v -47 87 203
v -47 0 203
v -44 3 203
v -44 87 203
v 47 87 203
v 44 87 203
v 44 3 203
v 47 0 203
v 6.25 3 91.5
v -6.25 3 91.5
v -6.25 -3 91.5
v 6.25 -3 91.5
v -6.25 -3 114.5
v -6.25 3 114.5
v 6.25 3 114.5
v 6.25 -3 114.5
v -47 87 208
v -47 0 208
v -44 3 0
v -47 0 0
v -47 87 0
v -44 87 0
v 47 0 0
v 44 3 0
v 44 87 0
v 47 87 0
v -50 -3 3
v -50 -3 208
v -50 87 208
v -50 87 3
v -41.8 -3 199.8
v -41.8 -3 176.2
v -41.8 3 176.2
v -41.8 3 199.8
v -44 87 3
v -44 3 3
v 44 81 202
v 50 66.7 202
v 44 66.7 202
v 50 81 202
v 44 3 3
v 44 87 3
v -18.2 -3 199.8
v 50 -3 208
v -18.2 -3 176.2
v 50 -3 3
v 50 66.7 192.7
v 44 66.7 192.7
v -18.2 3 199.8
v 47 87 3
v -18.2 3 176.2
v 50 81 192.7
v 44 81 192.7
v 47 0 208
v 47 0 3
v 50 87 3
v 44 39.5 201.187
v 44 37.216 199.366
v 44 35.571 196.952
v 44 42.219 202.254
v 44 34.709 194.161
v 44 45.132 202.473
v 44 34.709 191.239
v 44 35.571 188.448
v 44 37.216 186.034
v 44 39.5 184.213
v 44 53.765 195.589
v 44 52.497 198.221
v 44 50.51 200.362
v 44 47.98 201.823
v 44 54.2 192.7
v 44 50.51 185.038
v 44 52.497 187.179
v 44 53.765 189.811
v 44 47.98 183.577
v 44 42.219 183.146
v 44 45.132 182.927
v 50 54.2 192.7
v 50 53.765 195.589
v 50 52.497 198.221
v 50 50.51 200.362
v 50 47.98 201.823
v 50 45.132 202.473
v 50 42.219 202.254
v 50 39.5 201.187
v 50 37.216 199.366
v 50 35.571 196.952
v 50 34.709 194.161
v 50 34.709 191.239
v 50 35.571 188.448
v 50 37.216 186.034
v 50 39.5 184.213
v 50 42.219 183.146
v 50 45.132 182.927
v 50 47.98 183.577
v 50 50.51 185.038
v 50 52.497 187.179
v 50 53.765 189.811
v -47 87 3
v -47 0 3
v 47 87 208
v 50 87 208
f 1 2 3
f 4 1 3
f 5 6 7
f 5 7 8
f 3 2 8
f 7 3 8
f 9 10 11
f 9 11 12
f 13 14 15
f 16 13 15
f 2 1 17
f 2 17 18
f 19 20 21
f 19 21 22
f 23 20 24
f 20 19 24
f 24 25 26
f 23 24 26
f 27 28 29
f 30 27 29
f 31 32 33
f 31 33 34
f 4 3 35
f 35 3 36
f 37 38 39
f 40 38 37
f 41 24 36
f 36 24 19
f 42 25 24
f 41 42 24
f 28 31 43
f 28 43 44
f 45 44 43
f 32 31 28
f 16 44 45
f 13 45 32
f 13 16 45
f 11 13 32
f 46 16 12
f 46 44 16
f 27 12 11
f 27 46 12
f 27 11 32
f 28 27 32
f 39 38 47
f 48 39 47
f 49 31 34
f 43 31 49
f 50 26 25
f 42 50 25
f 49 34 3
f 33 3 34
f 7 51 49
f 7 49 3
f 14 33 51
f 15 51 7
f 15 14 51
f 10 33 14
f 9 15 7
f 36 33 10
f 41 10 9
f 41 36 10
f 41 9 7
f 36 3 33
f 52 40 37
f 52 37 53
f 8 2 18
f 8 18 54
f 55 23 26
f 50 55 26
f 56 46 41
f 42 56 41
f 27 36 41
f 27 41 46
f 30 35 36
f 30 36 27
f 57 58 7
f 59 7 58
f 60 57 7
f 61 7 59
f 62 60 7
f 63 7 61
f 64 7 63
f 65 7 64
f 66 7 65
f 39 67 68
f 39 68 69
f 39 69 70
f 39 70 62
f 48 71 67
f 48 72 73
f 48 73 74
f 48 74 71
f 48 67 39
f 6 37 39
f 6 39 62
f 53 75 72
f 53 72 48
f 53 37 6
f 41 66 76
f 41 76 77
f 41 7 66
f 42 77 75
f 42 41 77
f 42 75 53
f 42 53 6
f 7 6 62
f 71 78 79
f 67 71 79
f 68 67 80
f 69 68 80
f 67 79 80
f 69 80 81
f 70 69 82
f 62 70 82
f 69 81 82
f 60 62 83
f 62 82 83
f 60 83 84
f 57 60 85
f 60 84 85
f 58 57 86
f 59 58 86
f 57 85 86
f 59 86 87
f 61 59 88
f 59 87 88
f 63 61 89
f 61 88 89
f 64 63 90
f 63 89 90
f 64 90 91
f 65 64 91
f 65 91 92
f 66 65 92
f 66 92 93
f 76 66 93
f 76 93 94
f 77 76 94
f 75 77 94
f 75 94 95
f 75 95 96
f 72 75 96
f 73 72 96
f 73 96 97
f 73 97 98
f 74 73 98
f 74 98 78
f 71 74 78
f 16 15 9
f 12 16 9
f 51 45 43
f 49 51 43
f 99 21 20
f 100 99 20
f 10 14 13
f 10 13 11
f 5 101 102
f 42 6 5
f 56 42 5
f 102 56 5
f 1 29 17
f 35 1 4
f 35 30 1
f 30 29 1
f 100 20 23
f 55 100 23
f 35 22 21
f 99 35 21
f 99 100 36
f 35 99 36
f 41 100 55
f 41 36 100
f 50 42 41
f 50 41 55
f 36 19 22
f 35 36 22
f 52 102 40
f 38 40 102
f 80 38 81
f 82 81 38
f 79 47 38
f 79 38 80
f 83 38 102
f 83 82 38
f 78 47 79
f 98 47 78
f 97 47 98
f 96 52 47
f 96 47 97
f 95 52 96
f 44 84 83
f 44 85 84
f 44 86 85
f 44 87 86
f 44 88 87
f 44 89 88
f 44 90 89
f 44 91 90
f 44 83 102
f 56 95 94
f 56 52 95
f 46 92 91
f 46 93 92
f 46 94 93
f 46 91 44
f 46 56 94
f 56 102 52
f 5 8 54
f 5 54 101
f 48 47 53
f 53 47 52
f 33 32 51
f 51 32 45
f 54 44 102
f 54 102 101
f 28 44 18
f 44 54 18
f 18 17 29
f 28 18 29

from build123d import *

# Parameters (mm, degrees)
SALIENTE_EXTRUIR1_DEPTH = 3
SALIENTE_EXTRUIR2_DEPTH = 100
SIMETR_A2_START         = -3
SIMETR_A2_OUTLINE_W     = 6
SIMETR_A2_OUTLINE_H     = 100
SIMETR_A2_DEPTH         = 90
SIMETR_A2_2_OUTLINE_W   = 88
SIMETR_A2_2_OUTLINE_H   = 100
SIMETR_A2_2_DEPTH       = 6
CROQUIS3_W              = 12.5
CROQUIS3_H              = 23
CORTAR_EXTRUIR1_DEPTH   = 6
CROQUIS5_W              = 23.6
CROQUIS5_H              = 23.6
CORTAR_EXTRUIR3_DEPTH   = 10
SALIENTE_EXTRUIR3_DEPTH = 5
CROQUIS7_R              = 9.8
CROQUIS7_W              = 9.3
CROQUIS7_H              = 14.3
CORTAR_EXTRUIR4_DEPTH   = 10


# Read off the part's stored shape, not the designer's step: Simetría2
with BuildPart() as part:
    # Croquis1 → Saliente-Extruir1 (new body)
    with BuildSketch(Plane.XY):
        Polygon((-47, 0), (47, 0), (47, 87), (44, 87), (44, 3), (-44, 3), (-44, 87), (-47, 87), align=None)
    extrude(amount=SALIENTE_EXTRUIR1_DEPTH)


with BuildPart() as body_2:
    # Croquis2 → Saliente-Extruir2 (new body)
    with BuildSketch(Plane.XY.offset(3)):
        Polygon((-44, 87), (-44, 3), (44, 3), (44, 87), (50, 87), (50, -3), (-50, -3), (-50, 87), align=None)
    extrude(amount=SALIENTE_EXTRUIR2_DEPTH)

    # Simetría2 outline → Simetría2 (add)
    with BuildSketch(Plane(origin=(0, 0, 0), x_dir=(1, 0, 0), z_dir=(0, 1, 0)).offset(SIMETR_A2_START)):
        with Locations((-47, -153)):
            Rectangle(SIMETR_A2_OUTLINE_W, SIMETR_A2_OUTLINE_H)
        with Locations((47, -153)):
            Rectangle(SIMETR_A2_OUTLINE_W, SIMETR_A2_OUTLINE_H)
    extrude(amount=SIMETR_A2_DEPTH)

    # Simetr_a2 2 outline → Simetr_a2 2 (add)
    with BuildSketch(Plane(origin=(0, 0, 0), x_dir=(1, 0, 0), z_dir=(0, 1, 0)).offset(SIMETR_A2_START)):
        with Locations((0, -153)):
            Rectangle(SIMETR_A2_2_OUTLINE_W, SIMETR_A2_2_OUTLINE_H)
    extrude(amount=SIMETR_A2_2_DEPTH)

    # Croquis3 → Cortar-Extruir1 (cut)
    with BuildSketch(Plane(origin=(0, 3, 0), x_dir=(1, 0, 0), z_dir=(0, 1, 0))):
        with Locations((0, -103)):
            Rectangle(CROQUIS3_W, CROQUIS3_H)
    extrude(amount=-CORTAR_EXTRUIR1_DEPTH, mode=Mode.SUBTRACT)

    # Croquis5 → Cortar-Extruir3 (cut)
    with BuildSketch(Plane.XZ.offset(3)):
        with Locations((-30, 188)):
            Rectangle(CROQUIS5_W, CROQUIS5_H)
    extrude(amount=-CORTAR_EXTRUIR3_DEPTH, mode=Mode.SUBTRACT)

    # Croquis6 → Saliente-Extruir3 (add)
    with BuildSketch(Plane.XY.offset(203)):
        Polygon((-50, 87), (-47, 87), (-47, 0), (47, 0), (47, 87), (50, 87), (50, -3), (-50, -3), align=None)
    extrude(amount=SALIENTE_EXTRUIR3_DEPTH)

    # Croquis7 → Cortar-Extruir4 (cut)
    with BuildSketch(Plane(origin=(50, 0, 0), x_dir=(0, 0, -1), z_dir=(1, 0, 0))):
        with Locations(Location((-192.7, 44.4, 0), (0, 0, 90))):
            Circle(CROQUIS7_R)
        with Locations((-197.35, 73.85)):
            Rectangle(CROQUIS7_W, CROQUIS7_H)
    extrude(amount=-CORTAR_EXTRUIR4_DEPTH, mode=Mode.SUBTRACT)


solid = Compound([part.part, body_2.part])
